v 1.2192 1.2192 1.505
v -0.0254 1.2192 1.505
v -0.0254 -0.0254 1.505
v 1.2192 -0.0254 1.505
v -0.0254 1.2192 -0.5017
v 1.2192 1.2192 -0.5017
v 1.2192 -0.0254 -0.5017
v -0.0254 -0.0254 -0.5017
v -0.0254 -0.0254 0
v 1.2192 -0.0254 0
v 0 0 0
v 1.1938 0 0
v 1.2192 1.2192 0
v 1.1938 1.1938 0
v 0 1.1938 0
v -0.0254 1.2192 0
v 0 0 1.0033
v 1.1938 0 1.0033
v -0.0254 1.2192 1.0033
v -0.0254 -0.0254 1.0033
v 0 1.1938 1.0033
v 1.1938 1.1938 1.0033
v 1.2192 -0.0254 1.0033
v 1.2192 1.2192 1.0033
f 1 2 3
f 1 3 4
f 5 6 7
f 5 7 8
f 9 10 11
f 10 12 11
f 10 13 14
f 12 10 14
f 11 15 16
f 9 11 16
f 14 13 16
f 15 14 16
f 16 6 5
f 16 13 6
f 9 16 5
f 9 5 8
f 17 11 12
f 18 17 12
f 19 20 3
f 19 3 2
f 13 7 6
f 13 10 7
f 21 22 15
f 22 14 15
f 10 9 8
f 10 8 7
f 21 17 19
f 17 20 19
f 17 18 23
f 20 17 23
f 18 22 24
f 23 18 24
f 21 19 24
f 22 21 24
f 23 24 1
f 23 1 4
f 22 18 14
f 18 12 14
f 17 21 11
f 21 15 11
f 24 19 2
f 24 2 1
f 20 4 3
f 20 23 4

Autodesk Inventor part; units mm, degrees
ref_plane "YZ Plane" through (0, 0, 0) normal (1, 0, 0) x (0, 1, 0)
ref_plane "XZ Plane" through (0, 0, 0) normal (0, 1, 0) x (-1, 0, 0)
ref_plane "XY Plane" through (0, 0, 0) normal (0, 0, 1) x (1, 0, 0)
sketch "Sketch1" plane through (0, 0, 0) normal (0, 0, 1) x (1, 0, 0)
  line L0 (0, 0) -> (1.1938, 0)
  line L1 (1.1938, 0) -> (1.1938, 1.1938)
  line L2 (1.1938, 1.1938) -> (0, 1.1938)
  line L3 (0, 1.1938) -> (0, 0)
  dimension "d0" = 1.1938
  dimension "d1" = 1.1938
extrude "Extrusion1" add sketch "Sketch1" along normal blind 1.0033
sketch "Sketch2" plane through (0, 0, 1.0033) normal (0, 0, 1) x (1, 0, 0)
  line L0 (-0.0254, 1.2192) -> (1.2192, 1.2192)
  line L1 (1.2192, 1.2192) -> (1.2192, -0.0254)
  line L2 (1.2192, -0.0254) -> (-0.0254, -0.0254)
  line L3 (-0.0254, -0.0254) -> (-0.0254, 1.2192)
  line L4 (1.1938, 0) -> (1.1938, 1.1938) projected
  line L5 (0, 1.1938) -> (0, 0) projected
  line L6 (1.1938, 1.1938) -> (0, 1.1938) projected
  line L7 (0, 0) -> (1.1938, 0) projected
  dimension "d4" = 0.0254
  dimension "d5" = 0.0254
  dimension "d6" = 0.0254
  dimension "d7" = 0.0254
extrude "Extrusion2" add sketch "Sketch2" along normal blind 0.5017 contours L0 L1 L2 L3 | L7 L5 L6 L4
sketch "Sketch3" plane through (0, 0, 0) normal (0, 0, -1) x (-1, 0, 0)
  line L0 (-1.2192, 1.2192) -> (0.0254, 1.2192)
  line L1 (0.0254, 1.2192) -> (0.0254, -0.0254)
  line L2 (0.0254, -0.0254) -> (-1.2192, -0.0254)
  line L3 (-1.2192, -0.0254) -> (-1.2192, 1.2192)
  point P0 (0, 0)
extrude "Extrusion3" add sketch "Sketch3" along normal blind 0.5017
properties part number "s1uF Capacitor"
